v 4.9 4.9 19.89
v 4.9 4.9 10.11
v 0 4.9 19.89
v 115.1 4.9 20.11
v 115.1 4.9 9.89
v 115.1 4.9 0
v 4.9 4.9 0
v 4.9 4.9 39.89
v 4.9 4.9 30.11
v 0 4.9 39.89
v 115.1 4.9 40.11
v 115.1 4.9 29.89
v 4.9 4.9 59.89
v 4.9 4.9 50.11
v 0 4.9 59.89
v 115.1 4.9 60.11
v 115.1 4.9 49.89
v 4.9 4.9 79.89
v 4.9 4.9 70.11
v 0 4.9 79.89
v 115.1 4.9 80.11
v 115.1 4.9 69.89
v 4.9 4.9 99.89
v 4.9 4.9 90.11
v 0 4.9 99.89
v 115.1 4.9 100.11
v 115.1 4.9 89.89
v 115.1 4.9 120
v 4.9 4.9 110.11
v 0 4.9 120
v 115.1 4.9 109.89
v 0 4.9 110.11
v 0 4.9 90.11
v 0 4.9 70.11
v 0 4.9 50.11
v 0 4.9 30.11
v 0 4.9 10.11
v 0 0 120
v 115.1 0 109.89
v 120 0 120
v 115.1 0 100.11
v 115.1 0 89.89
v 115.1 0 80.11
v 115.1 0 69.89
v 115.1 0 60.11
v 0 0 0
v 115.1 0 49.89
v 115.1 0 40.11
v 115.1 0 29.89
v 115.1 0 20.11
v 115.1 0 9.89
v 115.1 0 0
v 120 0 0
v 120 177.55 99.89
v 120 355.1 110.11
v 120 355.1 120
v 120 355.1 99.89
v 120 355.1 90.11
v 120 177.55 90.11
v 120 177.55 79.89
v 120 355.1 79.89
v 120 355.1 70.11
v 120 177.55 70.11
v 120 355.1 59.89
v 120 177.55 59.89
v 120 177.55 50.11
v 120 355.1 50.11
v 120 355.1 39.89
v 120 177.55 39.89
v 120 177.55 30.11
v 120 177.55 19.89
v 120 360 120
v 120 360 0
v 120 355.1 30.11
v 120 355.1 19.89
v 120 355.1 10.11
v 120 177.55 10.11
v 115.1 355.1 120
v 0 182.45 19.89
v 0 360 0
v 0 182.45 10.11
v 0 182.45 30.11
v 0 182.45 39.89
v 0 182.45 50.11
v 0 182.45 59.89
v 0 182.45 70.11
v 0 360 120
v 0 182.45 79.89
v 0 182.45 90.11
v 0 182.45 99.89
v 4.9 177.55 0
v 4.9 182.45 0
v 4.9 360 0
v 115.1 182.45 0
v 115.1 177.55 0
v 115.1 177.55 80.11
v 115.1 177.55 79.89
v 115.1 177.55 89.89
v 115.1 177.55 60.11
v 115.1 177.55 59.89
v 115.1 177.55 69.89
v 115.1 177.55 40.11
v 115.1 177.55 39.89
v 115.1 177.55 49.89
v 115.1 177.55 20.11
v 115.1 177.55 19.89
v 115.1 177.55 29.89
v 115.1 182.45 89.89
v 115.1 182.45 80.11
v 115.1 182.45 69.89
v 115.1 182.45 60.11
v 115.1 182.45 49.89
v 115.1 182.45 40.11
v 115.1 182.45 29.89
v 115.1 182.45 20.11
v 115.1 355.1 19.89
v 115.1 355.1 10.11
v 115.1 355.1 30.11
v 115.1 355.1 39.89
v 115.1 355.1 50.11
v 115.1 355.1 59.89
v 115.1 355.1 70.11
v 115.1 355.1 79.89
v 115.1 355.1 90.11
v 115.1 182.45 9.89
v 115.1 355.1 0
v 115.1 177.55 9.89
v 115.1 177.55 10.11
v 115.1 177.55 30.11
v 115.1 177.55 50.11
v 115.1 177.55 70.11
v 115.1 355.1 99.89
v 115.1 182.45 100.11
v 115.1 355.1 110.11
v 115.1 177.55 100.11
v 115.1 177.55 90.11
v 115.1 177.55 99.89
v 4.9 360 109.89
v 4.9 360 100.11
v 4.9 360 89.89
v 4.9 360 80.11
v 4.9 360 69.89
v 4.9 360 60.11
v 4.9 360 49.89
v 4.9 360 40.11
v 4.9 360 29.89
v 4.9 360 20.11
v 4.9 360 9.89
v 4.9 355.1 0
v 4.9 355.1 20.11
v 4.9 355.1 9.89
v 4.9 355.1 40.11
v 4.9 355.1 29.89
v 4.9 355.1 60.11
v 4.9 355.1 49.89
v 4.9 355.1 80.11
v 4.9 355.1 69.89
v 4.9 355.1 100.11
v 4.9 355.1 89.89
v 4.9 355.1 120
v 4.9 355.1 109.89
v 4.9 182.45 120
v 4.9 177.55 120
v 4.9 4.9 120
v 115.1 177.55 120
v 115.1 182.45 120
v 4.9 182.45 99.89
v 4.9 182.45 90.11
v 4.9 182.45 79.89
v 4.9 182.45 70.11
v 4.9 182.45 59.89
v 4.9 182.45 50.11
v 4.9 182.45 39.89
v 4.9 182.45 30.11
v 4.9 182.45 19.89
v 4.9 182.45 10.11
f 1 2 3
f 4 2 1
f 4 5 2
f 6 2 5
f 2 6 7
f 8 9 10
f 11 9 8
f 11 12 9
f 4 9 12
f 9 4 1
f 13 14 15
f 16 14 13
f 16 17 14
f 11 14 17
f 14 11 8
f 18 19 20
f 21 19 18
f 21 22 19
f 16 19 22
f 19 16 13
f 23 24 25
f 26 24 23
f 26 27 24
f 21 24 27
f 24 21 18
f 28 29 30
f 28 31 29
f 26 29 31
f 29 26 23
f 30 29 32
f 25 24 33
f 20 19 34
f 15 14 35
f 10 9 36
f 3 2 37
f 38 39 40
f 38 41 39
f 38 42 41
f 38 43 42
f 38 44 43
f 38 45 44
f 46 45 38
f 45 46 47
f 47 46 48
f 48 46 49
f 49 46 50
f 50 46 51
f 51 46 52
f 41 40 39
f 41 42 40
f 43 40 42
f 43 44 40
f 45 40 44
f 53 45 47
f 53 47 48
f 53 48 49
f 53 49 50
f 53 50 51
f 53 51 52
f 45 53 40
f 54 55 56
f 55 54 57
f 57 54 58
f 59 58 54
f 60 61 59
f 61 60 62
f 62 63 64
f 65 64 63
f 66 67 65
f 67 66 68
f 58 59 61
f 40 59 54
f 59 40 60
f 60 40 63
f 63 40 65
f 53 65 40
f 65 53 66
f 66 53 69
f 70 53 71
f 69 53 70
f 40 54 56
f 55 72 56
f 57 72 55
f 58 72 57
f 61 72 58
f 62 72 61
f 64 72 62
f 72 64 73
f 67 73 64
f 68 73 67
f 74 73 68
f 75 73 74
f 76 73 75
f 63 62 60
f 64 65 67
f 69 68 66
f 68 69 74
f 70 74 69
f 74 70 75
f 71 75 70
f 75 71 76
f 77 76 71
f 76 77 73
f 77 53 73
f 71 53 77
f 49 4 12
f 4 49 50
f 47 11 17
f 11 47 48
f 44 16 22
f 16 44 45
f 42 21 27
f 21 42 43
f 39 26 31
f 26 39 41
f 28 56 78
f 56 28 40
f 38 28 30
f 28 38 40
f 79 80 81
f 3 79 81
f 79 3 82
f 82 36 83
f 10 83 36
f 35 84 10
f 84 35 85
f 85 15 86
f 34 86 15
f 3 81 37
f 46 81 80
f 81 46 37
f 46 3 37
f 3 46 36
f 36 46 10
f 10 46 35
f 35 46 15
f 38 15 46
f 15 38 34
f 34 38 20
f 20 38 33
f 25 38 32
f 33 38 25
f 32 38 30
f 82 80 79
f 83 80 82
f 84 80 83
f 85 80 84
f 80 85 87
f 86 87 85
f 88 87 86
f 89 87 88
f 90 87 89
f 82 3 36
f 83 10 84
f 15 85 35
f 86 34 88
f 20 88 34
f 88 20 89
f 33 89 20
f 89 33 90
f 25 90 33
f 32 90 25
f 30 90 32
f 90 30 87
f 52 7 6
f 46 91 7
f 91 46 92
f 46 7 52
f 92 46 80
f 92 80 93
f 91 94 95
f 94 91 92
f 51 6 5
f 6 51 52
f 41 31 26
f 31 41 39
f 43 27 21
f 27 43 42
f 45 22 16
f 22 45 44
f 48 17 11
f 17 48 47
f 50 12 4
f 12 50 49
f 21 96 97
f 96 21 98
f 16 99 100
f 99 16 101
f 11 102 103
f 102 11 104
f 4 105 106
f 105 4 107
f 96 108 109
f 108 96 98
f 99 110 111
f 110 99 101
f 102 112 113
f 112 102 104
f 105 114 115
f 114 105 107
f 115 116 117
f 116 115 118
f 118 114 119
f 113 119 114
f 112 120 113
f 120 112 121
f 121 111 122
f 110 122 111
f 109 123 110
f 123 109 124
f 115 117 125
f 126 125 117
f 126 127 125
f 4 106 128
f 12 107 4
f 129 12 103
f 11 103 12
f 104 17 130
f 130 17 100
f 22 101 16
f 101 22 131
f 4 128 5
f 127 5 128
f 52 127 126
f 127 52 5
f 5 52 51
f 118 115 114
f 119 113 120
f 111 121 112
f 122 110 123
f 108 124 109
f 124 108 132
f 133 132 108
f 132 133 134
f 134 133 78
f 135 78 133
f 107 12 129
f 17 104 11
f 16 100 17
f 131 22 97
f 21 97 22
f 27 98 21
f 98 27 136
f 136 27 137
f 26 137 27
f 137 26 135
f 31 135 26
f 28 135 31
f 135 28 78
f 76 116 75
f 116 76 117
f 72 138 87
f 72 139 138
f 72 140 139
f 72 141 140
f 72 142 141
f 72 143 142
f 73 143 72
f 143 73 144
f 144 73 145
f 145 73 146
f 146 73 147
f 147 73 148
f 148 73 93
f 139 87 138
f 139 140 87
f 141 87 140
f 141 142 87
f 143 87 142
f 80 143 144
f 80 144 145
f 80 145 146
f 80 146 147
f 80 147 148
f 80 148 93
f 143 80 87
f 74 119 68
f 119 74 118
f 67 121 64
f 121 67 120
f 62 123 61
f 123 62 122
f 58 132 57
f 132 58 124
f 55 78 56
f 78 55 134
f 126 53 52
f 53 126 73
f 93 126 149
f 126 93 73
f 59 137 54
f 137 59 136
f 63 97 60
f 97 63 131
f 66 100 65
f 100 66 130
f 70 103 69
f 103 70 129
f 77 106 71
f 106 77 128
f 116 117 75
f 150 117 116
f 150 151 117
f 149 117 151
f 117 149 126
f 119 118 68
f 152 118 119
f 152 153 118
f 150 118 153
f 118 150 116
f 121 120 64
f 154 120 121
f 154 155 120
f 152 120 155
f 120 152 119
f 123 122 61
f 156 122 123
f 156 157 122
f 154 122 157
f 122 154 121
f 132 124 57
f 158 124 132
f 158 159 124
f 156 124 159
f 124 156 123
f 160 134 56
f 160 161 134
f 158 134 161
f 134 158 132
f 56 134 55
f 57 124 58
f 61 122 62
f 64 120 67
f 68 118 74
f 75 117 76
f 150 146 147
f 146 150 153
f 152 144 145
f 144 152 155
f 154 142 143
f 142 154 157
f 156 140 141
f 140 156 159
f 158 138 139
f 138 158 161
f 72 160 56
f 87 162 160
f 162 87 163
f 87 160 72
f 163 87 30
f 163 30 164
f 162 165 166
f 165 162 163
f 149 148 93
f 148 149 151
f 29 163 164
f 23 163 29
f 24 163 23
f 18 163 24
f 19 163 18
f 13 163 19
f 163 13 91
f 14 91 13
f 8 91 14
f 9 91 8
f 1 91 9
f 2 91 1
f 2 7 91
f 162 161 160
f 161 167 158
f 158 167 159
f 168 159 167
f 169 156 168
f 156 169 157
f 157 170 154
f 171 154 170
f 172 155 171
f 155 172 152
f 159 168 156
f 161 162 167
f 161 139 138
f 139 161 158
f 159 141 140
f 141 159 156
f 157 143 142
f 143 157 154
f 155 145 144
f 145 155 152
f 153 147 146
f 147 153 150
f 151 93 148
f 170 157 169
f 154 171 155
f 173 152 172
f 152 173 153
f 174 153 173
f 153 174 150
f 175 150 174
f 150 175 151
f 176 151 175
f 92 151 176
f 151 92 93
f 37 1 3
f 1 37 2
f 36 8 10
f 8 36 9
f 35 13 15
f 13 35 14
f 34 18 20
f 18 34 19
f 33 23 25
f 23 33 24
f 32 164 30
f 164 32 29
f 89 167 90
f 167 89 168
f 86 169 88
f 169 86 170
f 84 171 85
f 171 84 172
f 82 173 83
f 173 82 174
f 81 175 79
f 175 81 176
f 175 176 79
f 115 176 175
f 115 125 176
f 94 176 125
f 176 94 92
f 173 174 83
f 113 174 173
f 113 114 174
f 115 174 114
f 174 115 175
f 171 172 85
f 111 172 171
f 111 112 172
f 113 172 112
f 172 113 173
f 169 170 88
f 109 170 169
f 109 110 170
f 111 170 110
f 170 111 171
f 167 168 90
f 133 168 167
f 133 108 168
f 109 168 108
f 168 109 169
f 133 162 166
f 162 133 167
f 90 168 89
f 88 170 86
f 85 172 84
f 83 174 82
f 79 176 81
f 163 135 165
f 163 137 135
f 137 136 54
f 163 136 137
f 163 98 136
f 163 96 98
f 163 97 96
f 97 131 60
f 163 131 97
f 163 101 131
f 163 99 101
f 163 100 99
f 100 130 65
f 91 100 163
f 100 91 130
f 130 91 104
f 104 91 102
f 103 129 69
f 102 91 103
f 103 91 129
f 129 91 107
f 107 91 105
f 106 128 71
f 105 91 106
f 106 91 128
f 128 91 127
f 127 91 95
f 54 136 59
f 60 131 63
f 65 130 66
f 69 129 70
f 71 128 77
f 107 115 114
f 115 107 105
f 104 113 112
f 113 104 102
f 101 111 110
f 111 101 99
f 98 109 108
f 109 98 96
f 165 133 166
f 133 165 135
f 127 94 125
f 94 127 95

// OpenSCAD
union() {
	union() {
		color(alpha = 1.0000000000, c = [0.8000000000, 0.5000000000, 0.2000000000]) {
			translate(v = [0, 4.9000000000, 0]) {
				rotate(a = 90, v = [1, 0, 0]) {
					linear_extrude(height = 4.9000000000) {
						union() {
							difference() {
								polygon(points = [[115.1000000000, 9.8900000000], [115.1000000000, 0.0000000000], [4.9000000000, 0.0000000000], [4.9000000000, 9.8900000000], [0.0000000000, 9.8900000000], [0.0000000000, 20.1100000000], [4.9000000000, 20.1100000000], [4.9000000000, 29.8900000000], [0.0000000000, 29.8900000000], [0.0000000000, 40.1100000000], [4.9000000000, 40.1100000000], [4.9000000000, 49.8900000000], [0.0000000000, 49.8900000000], [0.0000000000, 60.1100000000], [4.9000000000, 60.1100000000], [4.9000000000, 69.8900000000], [0.0000000000, 69.8900000000], [0.0000000000, 80.1100000000], [4.9000000000, 80.1100000000], [4.9000000000, 89.8900000000], [0.0000000000, 89.8900000000], [0.0000000000, 100.1100000000], [4.9000000000, 100.1100000000], [4.9000000000, 109.8900000000], [0.0000000000, 109.8900000000], [0.0000000000, 120.0000000000], [120.0000000000, 120.0000000000], [120.0000000000, 109.8900000000], [115.1000000000, 109.8900000000], [115.1000000000, 100.1100000000], [120.0000000000, 100.1100000000], [120.0000000000, 89.8900000000], [115.1000000000, 89.8900000000], [115.1000000000, 80.1100000000], [120.0000000000, 80.1100000000], [120.0000000000, 69.8900000000], [115.1000000000, 69.8900000000], [115.1000000000, 60.1100000000], [120.0000000000, 60.1100000000], [120.0000000000, 49.8900000000], [115.1000000000, 49.8900000000], [115.1000000000, 40.1100000000], [120.0000000000, 40.1100000000], [120.0000000000, 29.8900000000], [115.1000000000, 29.8900000000], [115.1000000000, 20.1100000000], [120.0000000000, 20.1100000000], [120.0000000000, 9.8900000000], [115.1000000000, 9.8900000000]]);
							}
						}
					}
				}
			}
		}
	}
	union() {
		color(alpha = 1.0000000000, c = [0.7000000000, 0.4000000000, 0.1000000000]) {
			translate(v = [115.1000000000, 0, 0]) {
				rotate(a = 90, v = [0, 0, 1]) {
					rotate(a = 90, v = [1, 0, 0]) {
						linear_extrude(height = 4.9000000000) {
							union() {
								difference() {
									polygon(points = [[0.0000000000, 10.1100000000], [4.9000000000, 10.1100000000], [4.9000000000, 19.8900000000], [0.0000000000, 19.8900000000], [0.0000000000, 30.1100000000], [4.9000000000, 30.1100000000], [4.9000000000, 39.8900000000], [0.0000000000, 39.8900000000], [0.0000000000, 50.1100000000], [4.9000000000, 50.1100000000], [4.9000000000, 59.8900000000], [0.0000000000, 59.8900000000], [0.0000000000, 70.1100000000], [4.9000000000, 70.1100000000], [4.9000000000, 79.8900000000], [0.0000000000, 79.8900000000], [0.0000000000, 90.1100000000], [4.9000000000, 90.1100000000], [4.9000000000, 99.8900000000], [0.0000000000, 99.8900000000], [0.0000000000, 110.1100000000], [4.9000000000, 110.1100000000], [4.9000000000, 120.0000000000], [355.1000000000, 120.0000000000], [355.1000000000, 110.1100000000], [360.0000000000, 110.1100000000], [360.0000000000, 99.8900000000], [355.1000000000, 99.8900000000], [355.1000000000, 90.1100000000], [360.0000000000, 90.1100000000], [360.0000000000, 79.8900000000], [355.1000000000, 79.8900000000], [355.1000000000, 70.1100000000], [360.0000000000, 70.1100000000], [360.0000000000, 59.8900000000], [355.1000000000, 59.8900000000], [355.1000000000, 50.1100000000], [360.0000000000, 50.1100000000], [360.0000000000, 39.8900000000], [355.1000000000, 39.8900000000], [355.1000000000, 30.1100000000], [360.0000000000, 30.1100000000], [360.0000000000, 19.8900000000], [355.1000000000, 19.8900000000], [355.1000000000, 10.1100000000], [360.0000000000, 10.1100000000], [360.0000000000, 0.0000000000], [0.0000000000, 0.0000000000], [0.0000000000, 10.1100000000]]);
									polygon(points = [[177.5500000000, 90.1100000000], [182.4500000000, 90.1100000000], [182.4500000000, 99.8900000000], [177.5500000000, 99.8900000000], [177.5500000000, 90.1100000000]]);
									polygon(points = [[177.5500000000, 70.1100000000], [182.4500000000, 70.1100000000], [182.4500000000, 79.8900000000], [177.5500000000, 79.8900000000], [177.5500000000, 70.1100000000]]);
									polygon(points = [[177.5500000000, 50.1100000000], [182.4500000000, 50.1100000000], [182.4500000000, 59.8900000000], [177.5500000000, 59.8900000000], [177.5500000000, 50.1100000000]]);
									polygon(points = [[177.5500000000, 30.1100000000], [182.4500000000, 30.1100000000], [182.4500000000, 39.8900000000], [177.5500000000, 39.8900000000], [177.5500000000, 30.1100000000]]);
									polygon(points = [[177.5500000000, 10.1100000000], [182.4500000000, 10.1100000000], [182.4500000000, 19.8900000000], [177.5500000000, 19.8900000000], [177.5500000000, 10.1100000000]]);
								}
							}
						}
					}
				}
			}
		}
	}
	union() {
		color(alpha = 1.0000000000, c = [0.8000000000, 0.5000000000, 0.2000000000]) {
			translate(v = [120, 355.1000000000, 0]) {
				rotate(a = 180, v = [0, 0, 1]) {
					rotate(a = 90, v = [1, 0, 0]) {
						linear_extrude(height = 4.9000000000) {
							union() {
								difference() {
									polygon(points = [[115.1000000000, 9.8900000000], [115.1000000000, 0.0000000000], [4.9000000000, 0.0000000000], [4.9000000000, 9.8900000000], [0.0000000000, 9.8900000000], [0.0000000000, 20.1100000000], [4.9000000000, 20.1100000000], [4.9000000000, 29.8900000000], [0.0000000000, 29.8900000000], [0.0000000000, 40.1100000000], [4.9000000000, 40.1100000000], [4.9000000000, 49.8900000000], [0.0000000000, 49.8900000000], [0.0000000000, 60.1100000000], [4.9000000000, 60.1100000000], [4.9000000000, 69.8900000000], [0.0000000000, 69.8900000000], [0.0000000000, 80.1100000000], [4.9000000000, 80.1100000000], [4.9000000000, 89.8900000000], [0.0000000000, 89.8900000000], [0.0000000000, 100.1100000000], [4.9000000000, 100.1100000000], [4.9000000000, 109.8900000000], [0.0000000000, 109.8900000000], [0.0000000000, 120.0000000000], [120.0000000000, 120.0000000000], [120.0000000000, 109.8900000000], [115.1000000000, 109.8900000000], [115.1000000000, 100.1100000000], [120.0000000000, 100.1100000000], [120.0000000000, 89.8900000000], [115.1000000000, 89.8900000000], [115.1000000000, 80.1100000000], [120.0000000000, 80.1100000000], [120.0000000000, 69.8900000000], [115.1000000000, 69.8900000000], [115.1000000000, 60.1100000000], [120.0000000000, 60.1100000000], [120.0000000000, 49.8900000000], [115.1000000000, 49.8900000000], [115.1000000000, 40.1100000000], [120.0000000000, 40.1100000000], [120.0000000000, 29.8900000000], [115.1000000000, 29.8900000000], [115.1000000000, 20.1100000000], [120.0000000000, 20.1100000000], [120.0000000000, 9.8900000000], [115.1000000000, 9.8900000000]]);
								}
							}
						}
					}
				}
			}
		}
	}
	union() {
		color(alpha = 1.0000000000, c = [0.7000000000, 0.4000000000, 0.1000000000]) {
			translate(v = [4.9000000000, 360, 0]) {
				rotate(a = 270, v = [0, 0, 1]) {
					rotate(a = 90, v = [1, 0, 0]) {
						linear_extrude(height = 4.9000000000) {
							union() {
								difference() {
									polygon(points = [[0.0000000000, 10.1100000000], [4.9000000000, 10.1100000000], [4.9000000000, 19.8900000000], [0.0000000000, 19.8900000000], [0.0000000000, 30.1100000000], [4.9000000000, 30.1100000000], [4.9000000000, 39.8900000000], [0.0000000000, 39.8900000000], [0.0000000000, 50.1100000000], [4.9000000000, 50.1100000000], [4.9000000000, 59.8900000000], [0.0000000000, 59.8900000000], [0.0000000000, 70.1100000000], [4.9000000000, 70.1100000000], [4.9000000000, 79.8900000000], [0.0000000000, 79.8900000000], [0.0000000000, 90.1100000000], [4.9000000000, 90.1100000000], [4.9000000000, 99.8900000000], [0.0000000000, 99.8900000000], [0.0000000000, 110.1100000000], [4.9000000000, 110.1100000000], [4.9000000000, 120.0000000000], [355.1000000000, 120.0000000000], [355.1000000000, 110.1100000000], [360.0000000000, 110.1100000000], [360.0000000000, 99.8900000000], [355.1000000000, 99.8900000000], [355.1000000000, 90.1100000000], [360.0000000000, 90.1100000000], [360.0000000000, 79.8900000000], [355.1000000000, 79.8900000000], [355.1000000000, 70.1100000000], [360.0000000000, 70.1100000000], [360.0000000000, 59.8900000000], [355.1000000000, 59.8900000000], [355.1000000000, 50.1100000000], [360.0000000000, 50.1100000000], [360.0000000000, 39.8900000000], [355.1000000000, 39.8900000000], [355.1000000000, 30.1100000000], [360.0000000000, 30.1100000000], [360.0000000000, 19.8900000000], [355.1000000000, 19.8900000000], [355.1000000000, 10.1100000000], [360.0000000000, 10.1100000000], [360.0000000000, 0.0000000000], [0.0000000000, 0.0000000000], [0.0000000000, 10.1100000000]]);
									polygon(points = [[177.5500000000, 90.1100000000], [182.4500000000, 90.1100000000], [182.4500000000, 99.8900000000], [177.5500000000, 99.8900000000], [177.5500000000, 90.1100000000]]);
									polygon(points = [[177.5500000000, 70.1100000000], [182.4500000000, 70.1100000000], [182.4500000000, 79.8900000000], [177.5500000000, 79.8900000000], [177.5500000000, 70.1100000000]]);
									polygon(points = [[177.5500000000, 50.1100000000], [182.4500000000, 50.1100000000], [182.4500000000, 59.8900000000], [177.5500000000, 59.8900000000], [177.5500000000, 50.1100000000]]);
									polygon(points = [[177.5500000000, 30.1100000000], [182.4500000000, 30.1100000000], [182.4500000000, 39.8900000000], [177.5500000000, 39.8900000000], [177.5500000000, 30.1100000000]]);
									polygon(points = [[177.5500000000, 10.1100000000], [182.4500000000, 10.1100000000], [182.4500000000, 19.8900000000], [177.5500000000, 19.8900000000], [177.5500000000, 10.1100000000]]);
								}
							}
						}
					}
				}
			}
		}
	}
	union() {
		color(alpha = 1.0000000000, c = [0.8000000000, 0.5000000000, 0.2000000000]) {
			translate(v = [0, 182.4500000000, 0]) {
				rotate(a = 90, v = [1, 0, 0]) {
					linear_extrude(height = 4.9000000000) {
						union() {
							difference() {
								polygon(points = [[115.1000000000, 105.0000000000], [115.1000000000, 100.1100000000], [120.0000000000, 100.1100000000], [120.0000000000, 89.8900000000], [115.1000000000, 89.8900000000], [115.1000000000, 80.1100000000], [120.0000000000, 80.1100000000], [120.0000000000, 69.8900000000], [115.1000000000, 69.8900000000], [115.1000000000, 60.1100000000], [120.0000000000, 60.1100000000], [120.0000000000, 49.8900000000], [115.1000000000, 49.8900000000], [115.1000000000, 40.1100000000], [120.0000000000, 40.1100000000], [120.0000000000, 29.8900000000], [115.1000000000, 29.8900000000], [115.1000000000, 20.1100000000], [120.0000000000, 20.1100000000], [120.0000000000, 9.8900000000], [115.1000000000, 9.8900000000], [115.1000000000, 0.0000000000], [4.9000000000, 0.0000000000], [4.9000000000, 9.8900000000], [0.0000000000, 9.8900000000], [0.0000000000, 20.1100000000], [4.9000000000, 20.1100000000], [4.9000000000, 29.8900000000], [0.0000000000, 29.8900000000], [0.0000000000, 40.1100000000], [4.9000000000, 40.1100000000], [4.9000000000, 49.8900000000], [0.0000000000, 49.8900000000], [0.0000000000, 60.1100000000], [4.9000000000, 60.1100000000], [4.9000000000, 69.8900000000], [0.0000000000, 69.8900000000], [0.0000000000, 80.1100000000], [4.9000000000, 80.1100000000], [4.9000000000, 89.8900000000], [0.0000000000, 89.8900000000], [0.0000000000, 100.1100000000], [4.9000000000, 100.1100000000], [4.9000000000, 105.0000000000], [4.9000000000, 109.8900000000], [4.9000000000, 120.0000000000], [115.1000000000, 120.0000000000], [115.1000000000, 109.8900000000], [115.1000000000, 105.0000000000]]);
							}
						}
					}
				}
			}
		}
	}
}
